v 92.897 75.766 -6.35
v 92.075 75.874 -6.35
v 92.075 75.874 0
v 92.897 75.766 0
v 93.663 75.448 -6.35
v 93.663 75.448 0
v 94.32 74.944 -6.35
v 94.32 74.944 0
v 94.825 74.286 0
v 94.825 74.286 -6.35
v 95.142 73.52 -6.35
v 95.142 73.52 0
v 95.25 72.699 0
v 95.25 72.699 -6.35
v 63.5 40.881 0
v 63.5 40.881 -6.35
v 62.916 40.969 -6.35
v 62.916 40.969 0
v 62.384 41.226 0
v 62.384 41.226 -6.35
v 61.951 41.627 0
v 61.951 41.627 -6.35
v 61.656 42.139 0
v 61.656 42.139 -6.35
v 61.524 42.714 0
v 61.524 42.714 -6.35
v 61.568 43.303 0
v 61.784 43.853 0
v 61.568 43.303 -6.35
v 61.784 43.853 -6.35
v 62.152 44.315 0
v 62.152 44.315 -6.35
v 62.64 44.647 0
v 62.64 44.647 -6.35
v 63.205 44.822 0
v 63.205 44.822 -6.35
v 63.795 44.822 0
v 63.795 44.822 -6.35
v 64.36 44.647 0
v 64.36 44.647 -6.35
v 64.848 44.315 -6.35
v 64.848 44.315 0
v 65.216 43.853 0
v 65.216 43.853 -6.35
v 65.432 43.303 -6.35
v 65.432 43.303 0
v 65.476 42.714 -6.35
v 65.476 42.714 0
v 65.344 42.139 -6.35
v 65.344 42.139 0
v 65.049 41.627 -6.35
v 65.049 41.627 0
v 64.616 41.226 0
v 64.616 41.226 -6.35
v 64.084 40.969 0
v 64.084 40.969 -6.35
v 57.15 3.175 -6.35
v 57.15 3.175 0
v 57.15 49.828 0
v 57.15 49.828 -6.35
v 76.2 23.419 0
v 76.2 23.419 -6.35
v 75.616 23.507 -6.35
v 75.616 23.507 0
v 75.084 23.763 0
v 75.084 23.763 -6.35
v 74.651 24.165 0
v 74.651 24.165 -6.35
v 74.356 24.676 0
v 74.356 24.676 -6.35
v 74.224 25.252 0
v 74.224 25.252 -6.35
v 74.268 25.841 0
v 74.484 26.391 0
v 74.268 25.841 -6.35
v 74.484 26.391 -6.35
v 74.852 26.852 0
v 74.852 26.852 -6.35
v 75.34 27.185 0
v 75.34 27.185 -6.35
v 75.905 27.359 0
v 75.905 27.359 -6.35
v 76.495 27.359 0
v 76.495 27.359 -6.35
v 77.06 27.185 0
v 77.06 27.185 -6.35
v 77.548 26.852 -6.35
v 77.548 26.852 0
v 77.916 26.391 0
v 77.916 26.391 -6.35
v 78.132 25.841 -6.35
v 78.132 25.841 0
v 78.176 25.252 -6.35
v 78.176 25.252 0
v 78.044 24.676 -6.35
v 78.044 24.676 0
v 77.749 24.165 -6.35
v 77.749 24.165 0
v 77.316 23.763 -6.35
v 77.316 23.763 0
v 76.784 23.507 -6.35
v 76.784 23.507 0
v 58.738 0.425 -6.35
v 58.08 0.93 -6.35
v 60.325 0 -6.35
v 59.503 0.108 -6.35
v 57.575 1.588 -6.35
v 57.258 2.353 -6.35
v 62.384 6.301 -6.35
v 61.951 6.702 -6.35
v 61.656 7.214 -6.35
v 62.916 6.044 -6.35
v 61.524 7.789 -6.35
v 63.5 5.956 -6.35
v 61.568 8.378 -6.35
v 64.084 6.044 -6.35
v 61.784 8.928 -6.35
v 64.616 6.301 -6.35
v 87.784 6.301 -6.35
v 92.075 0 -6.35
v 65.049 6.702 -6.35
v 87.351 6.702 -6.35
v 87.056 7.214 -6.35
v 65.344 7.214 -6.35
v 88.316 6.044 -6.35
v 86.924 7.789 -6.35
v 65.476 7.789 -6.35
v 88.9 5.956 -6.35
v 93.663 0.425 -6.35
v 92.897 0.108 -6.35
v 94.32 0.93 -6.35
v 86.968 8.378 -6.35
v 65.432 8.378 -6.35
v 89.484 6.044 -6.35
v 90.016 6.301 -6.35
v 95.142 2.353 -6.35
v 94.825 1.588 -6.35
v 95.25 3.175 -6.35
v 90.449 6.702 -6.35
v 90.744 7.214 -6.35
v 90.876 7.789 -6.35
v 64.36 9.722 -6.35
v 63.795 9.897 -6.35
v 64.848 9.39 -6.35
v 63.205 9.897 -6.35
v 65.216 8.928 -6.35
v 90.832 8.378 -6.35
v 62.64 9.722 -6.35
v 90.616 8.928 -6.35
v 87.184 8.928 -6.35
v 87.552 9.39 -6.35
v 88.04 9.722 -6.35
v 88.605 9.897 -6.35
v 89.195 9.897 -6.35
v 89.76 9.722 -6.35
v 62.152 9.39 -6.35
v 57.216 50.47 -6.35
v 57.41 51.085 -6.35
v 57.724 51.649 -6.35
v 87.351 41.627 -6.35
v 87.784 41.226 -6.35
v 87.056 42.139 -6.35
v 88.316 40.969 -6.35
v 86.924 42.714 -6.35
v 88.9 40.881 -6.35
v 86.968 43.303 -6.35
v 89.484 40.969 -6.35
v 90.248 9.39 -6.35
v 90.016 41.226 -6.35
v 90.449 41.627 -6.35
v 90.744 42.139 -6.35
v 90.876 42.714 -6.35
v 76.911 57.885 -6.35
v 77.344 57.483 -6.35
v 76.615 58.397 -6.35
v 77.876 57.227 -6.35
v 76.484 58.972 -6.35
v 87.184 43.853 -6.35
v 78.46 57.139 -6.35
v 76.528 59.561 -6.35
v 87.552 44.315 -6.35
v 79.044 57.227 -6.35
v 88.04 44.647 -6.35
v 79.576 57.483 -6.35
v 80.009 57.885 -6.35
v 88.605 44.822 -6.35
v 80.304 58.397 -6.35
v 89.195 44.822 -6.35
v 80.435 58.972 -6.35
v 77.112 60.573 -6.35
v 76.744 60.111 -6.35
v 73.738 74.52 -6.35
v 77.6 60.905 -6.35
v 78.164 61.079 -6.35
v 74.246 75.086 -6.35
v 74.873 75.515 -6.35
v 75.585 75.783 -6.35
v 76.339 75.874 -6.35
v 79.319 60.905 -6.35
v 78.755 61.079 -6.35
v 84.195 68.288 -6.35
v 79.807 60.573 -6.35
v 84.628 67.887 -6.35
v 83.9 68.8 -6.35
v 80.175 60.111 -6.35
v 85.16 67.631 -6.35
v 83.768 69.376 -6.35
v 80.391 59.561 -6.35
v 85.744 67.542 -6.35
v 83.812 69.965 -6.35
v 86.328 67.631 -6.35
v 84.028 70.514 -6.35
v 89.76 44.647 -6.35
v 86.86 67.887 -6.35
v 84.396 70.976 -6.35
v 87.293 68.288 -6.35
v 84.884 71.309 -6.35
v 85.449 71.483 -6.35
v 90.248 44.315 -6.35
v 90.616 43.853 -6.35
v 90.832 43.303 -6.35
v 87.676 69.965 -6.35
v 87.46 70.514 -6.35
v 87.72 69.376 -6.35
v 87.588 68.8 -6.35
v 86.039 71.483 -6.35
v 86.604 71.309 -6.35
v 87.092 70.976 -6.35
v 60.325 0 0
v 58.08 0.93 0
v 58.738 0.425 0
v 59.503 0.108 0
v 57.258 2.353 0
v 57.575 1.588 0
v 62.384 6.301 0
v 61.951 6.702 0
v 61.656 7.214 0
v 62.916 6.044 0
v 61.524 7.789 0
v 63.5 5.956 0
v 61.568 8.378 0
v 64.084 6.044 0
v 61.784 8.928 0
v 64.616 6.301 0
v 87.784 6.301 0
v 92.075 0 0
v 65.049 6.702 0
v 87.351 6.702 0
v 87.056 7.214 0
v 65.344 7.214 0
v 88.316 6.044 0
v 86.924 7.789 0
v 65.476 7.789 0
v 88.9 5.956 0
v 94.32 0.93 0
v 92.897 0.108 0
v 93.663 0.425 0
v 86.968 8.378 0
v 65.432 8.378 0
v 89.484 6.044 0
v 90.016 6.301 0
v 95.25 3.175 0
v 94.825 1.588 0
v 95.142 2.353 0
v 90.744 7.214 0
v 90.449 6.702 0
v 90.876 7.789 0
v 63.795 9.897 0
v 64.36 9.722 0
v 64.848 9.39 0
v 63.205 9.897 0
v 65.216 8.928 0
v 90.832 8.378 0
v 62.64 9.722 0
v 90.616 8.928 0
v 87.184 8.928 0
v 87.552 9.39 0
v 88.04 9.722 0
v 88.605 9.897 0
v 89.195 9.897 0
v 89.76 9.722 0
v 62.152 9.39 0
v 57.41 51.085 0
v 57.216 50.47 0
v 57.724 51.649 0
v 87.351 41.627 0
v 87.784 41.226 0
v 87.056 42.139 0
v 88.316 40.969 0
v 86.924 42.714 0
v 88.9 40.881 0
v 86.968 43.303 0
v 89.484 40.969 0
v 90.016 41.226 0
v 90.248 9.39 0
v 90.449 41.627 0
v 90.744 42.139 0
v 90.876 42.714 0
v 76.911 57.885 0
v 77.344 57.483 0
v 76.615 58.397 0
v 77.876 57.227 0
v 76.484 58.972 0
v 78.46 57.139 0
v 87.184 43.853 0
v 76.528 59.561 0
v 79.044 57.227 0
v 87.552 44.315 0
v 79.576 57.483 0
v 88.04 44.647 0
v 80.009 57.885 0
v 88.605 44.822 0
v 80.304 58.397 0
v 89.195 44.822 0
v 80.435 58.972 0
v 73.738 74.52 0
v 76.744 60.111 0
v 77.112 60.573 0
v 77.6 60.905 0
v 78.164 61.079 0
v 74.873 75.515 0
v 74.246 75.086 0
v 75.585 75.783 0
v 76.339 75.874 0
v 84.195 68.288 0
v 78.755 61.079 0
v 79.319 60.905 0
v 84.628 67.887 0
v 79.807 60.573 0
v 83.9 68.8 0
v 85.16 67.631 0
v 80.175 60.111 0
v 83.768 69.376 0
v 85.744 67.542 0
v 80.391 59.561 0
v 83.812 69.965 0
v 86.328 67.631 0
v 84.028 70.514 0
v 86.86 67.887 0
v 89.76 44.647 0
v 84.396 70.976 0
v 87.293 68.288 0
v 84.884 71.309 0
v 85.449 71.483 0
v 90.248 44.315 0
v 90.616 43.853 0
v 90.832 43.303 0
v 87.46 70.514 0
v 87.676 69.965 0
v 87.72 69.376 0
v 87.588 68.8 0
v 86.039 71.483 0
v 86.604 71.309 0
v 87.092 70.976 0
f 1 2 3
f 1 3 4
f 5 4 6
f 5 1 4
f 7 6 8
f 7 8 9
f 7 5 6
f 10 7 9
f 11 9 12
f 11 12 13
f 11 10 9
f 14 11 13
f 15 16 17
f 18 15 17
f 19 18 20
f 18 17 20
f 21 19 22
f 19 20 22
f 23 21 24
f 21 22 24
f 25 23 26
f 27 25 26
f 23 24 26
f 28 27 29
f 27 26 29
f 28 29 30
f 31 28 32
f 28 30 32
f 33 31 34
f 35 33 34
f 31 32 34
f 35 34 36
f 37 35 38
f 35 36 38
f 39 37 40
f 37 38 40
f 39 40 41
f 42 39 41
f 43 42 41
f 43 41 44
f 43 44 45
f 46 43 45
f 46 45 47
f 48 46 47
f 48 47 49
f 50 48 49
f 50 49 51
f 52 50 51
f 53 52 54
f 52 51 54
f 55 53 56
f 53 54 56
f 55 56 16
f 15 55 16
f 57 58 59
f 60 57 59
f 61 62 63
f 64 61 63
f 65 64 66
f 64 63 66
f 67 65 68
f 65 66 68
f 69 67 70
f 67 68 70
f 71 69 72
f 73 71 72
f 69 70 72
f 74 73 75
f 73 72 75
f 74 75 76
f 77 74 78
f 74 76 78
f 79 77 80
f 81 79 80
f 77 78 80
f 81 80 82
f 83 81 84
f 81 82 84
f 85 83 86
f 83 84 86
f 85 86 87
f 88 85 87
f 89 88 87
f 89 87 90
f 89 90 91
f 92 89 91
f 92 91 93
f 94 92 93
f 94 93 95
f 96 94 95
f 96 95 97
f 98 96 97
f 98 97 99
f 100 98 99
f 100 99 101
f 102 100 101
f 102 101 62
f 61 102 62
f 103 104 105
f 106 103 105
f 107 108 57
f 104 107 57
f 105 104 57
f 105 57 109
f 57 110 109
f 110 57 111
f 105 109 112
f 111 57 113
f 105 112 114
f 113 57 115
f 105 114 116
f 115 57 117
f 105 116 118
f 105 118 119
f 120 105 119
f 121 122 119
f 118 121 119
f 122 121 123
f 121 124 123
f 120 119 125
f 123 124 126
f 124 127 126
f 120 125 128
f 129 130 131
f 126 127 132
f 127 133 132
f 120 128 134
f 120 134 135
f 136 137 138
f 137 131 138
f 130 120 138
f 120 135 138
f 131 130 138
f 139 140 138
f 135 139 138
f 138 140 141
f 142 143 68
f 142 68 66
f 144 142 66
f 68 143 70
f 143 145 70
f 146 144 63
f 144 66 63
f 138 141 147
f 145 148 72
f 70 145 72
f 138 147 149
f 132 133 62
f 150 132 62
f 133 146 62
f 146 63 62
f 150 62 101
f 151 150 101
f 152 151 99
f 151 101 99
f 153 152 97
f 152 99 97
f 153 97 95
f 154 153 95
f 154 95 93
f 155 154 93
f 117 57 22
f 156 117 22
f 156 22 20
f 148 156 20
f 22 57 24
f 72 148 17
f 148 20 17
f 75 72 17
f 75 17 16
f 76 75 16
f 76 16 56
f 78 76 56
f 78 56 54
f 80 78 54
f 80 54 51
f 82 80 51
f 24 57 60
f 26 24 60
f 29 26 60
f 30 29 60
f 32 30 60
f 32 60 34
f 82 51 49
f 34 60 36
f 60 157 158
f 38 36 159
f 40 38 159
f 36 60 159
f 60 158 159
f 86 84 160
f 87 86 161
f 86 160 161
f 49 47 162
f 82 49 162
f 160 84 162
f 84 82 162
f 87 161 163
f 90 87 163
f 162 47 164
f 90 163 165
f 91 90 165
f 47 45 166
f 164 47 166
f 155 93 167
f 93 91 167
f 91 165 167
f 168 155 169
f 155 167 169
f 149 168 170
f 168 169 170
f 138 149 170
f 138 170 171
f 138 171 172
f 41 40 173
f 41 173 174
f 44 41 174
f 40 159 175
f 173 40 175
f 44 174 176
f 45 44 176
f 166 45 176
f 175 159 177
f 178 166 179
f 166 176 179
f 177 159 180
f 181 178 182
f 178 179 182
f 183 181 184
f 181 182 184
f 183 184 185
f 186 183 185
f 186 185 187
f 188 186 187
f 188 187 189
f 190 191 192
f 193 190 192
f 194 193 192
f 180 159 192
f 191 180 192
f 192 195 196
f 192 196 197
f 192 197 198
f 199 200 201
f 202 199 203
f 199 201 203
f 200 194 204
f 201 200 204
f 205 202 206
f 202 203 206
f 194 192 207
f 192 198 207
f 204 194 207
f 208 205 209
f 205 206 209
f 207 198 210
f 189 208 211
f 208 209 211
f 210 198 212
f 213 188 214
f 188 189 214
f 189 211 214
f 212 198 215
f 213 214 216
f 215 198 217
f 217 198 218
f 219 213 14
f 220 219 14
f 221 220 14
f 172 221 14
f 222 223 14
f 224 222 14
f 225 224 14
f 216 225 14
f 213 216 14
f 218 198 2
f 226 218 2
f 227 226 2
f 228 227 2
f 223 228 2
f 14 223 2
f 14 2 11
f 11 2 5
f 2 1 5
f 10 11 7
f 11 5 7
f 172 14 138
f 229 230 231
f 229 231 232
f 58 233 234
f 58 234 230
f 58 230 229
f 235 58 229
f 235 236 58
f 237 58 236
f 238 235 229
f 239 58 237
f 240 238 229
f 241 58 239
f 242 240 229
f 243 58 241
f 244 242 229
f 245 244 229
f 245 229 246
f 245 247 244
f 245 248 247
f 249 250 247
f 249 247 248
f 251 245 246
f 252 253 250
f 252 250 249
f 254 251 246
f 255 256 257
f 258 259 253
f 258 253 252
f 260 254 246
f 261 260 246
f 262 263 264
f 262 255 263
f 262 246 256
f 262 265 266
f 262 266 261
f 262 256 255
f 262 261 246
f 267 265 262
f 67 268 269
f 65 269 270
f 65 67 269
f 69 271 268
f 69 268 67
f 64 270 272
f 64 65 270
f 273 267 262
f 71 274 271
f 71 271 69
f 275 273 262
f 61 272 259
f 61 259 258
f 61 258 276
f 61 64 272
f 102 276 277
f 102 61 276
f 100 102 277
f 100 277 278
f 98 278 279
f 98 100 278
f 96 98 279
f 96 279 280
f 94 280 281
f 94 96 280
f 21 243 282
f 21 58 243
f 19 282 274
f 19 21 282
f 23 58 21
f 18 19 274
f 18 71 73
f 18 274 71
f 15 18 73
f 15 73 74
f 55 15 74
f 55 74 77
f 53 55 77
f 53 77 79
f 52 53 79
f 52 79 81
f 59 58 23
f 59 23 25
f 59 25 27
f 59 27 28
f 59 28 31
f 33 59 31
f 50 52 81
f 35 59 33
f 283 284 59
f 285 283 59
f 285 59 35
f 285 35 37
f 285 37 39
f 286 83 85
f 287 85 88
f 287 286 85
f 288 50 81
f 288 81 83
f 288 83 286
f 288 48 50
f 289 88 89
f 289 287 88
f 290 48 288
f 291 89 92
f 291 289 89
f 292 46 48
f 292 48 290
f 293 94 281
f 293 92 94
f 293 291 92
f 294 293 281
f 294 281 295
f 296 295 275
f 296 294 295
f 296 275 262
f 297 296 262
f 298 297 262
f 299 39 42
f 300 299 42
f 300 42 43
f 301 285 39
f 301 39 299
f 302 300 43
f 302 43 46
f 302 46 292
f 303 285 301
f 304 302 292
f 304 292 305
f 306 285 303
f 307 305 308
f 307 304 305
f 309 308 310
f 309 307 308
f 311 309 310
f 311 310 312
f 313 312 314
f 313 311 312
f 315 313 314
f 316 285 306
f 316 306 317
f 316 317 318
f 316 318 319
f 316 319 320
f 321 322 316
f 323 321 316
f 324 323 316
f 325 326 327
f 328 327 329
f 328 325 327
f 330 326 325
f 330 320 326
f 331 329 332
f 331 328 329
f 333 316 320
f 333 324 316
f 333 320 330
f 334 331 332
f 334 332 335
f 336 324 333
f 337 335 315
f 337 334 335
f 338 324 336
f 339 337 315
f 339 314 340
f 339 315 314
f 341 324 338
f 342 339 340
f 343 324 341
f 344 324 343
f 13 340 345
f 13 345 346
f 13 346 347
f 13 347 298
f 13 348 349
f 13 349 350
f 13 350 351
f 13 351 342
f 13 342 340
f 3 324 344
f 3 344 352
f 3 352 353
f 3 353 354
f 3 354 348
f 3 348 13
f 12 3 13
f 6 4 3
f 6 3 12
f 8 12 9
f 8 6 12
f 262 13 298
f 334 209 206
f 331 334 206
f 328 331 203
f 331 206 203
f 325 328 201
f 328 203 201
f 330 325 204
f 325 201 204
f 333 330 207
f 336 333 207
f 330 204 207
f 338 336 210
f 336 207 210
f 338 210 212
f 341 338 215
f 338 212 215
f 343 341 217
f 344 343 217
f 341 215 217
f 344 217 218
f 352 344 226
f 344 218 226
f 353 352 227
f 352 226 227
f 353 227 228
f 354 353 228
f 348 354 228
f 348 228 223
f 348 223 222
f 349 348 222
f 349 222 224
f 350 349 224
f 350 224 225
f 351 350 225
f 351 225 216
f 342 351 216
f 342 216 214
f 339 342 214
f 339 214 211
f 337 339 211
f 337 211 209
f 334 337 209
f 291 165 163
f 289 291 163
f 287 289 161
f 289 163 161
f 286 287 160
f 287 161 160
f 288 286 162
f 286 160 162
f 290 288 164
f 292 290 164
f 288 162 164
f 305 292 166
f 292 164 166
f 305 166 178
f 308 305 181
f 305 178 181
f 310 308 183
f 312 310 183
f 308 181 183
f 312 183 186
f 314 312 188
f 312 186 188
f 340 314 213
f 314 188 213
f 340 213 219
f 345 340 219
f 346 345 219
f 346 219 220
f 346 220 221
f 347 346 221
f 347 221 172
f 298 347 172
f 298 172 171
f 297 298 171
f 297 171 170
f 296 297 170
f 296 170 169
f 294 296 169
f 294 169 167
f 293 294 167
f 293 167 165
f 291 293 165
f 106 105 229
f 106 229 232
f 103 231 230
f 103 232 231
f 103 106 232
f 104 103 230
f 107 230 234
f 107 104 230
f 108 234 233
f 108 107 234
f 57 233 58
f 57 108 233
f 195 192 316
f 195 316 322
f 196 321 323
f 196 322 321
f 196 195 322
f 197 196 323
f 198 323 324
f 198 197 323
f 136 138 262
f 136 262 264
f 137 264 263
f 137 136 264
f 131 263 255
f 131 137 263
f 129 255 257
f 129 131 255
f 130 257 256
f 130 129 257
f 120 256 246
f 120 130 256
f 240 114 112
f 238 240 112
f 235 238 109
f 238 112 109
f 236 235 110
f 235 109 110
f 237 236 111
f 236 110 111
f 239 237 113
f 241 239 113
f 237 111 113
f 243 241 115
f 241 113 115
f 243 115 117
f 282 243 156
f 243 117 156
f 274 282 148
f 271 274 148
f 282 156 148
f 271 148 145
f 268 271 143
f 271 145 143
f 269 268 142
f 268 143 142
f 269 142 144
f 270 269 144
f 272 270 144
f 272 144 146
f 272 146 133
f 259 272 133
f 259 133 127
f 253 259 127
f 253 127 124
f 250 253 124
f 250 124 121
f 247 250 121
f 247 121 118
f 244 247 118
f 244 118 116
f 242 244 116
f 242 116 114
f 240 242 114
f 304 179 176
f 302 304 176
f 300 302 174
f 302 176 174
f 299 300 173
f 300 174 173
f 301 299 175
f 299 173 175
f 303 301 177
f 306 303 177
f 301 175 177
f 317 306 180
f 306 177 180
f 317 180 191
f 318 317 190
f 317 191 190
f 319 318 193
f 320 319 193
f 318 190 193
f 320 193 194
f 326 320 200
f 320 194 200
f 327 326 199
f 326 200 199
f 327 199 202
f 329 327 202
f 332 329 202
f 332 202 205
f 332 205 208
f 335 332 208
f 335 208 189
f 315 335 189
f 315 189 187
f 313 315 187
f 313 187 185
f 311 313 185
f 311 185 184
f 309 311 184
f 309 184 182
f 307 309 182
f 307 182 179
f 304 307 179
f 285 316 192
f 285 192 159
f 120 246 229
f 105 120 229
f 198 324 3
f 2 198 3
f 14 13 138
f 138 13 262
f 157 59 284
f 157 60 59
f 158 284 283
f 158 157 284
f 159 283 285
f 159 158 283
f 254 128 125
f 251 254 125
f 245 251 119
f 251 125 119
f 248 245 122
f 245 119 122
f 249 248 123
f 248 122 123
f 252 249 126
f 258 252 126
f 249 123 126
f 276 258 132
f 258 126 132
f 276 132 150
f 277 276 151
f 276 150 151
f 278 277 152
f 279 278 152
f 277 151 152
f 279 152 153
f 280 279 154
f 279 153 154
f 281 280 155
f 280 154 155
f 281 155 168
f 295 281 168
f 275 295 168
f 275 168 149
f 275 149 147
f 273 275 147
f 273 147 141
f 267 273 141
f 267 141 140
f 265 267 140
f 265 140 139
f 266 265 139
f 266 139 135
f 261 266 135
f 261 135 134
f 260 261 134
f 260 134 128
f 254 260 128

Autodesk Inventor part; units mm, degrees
ref_plane "YZ Plane" through (0, 0, 0) normal (1, 0, 0) x (0, 1, 0)
ref_plane "XZ Plane" through (0, 0, 0) normal (0, 1, 0) x (-1, 0, 0)
ref_plane "XY Plane" through (0, 0, 0) normal (0, 0, 1) x (1, 0, 0)
sketch "Sketch1" plane through (0, 0, 0) normal (0, 0, 1) x (1, 0, 0)
  line L0 (0, 0) -> (355.6, 0) construction
  line L1 (355.6, 0) -> (355.6, 50.8) construction
  line L2 (355.6, 50.8) -> (0, 50.8) construction
  line L3 (0, 50.8) -> (0, 0) construction
  line L4 (57.1297, 50.8) -> (304.8, 404.5099) construction
  line L5 (304.8, 404.5099) -> (325.6065, 389.941) construction
  line L6 (325.6065, 389.941) -> (77.9362, 36.2312) construction
  line L7 (77.9362, 36.2312) -> (57.1297, 50.8) construction
  line L8 (355.6, 50.8) -> (304.8, 50.8) construction
  line L9 (304.8, 50.8) -> (304.8, 438.15) construction
  line L10 (304.8, 438.15) -> (355.6, 438.15) construction
  line L11 (355.6, 438.15) -> (355.6, 50.8) construction
  line L12 (57.15, 75.8737) -> (95.25, 75.8737)
  line L13 (95.25, 75.8737) -> (95.25, 0)
  line L14 (95.25, 0) -> (57.15, 0)
  line L15 (57.15, 0) -> (57.15, 75.8737)
  line L16 (320.675, 41.275) -> (288.925, 41.275) construction
  line L17 (288.925, 41.275) -> (288.925, 9.525) construction
  line L18 (288.925, 9.525) -> (320.675, 9.525) construction
  line L19 (320.675, 9.525) -> (320.675, 41.275) construction
  line L20 (234.95, 41.275) -> (203.2, 41.275) construction
  line L21 (203.2, 41.275) -> (203.2, 9.525) construction
  line L22 (203.2, 9.525) -> (234.95, 9.525) construction
  line L23 (234.95, 9.525) -> (234.95, 41.275) construction
  line L24 (67.5329, 43.5156) -> (111.2395, 105.935) construction
  circle A0 centre (63.5, 42.8625) radius 2.5527 construction
  line L25 (74.6865, 75.8737) -> (57.1297, 50.8)
  point P0 (88.1374, 50.8)
  point P1 (342.9, 42.8625)
  point P2 (330.2, 25.4)
  point P3 (342.9, 7.9375)
  point P4 (355.6, 25.4)
  point P5 (317.5, 42.8625)
  point P6 (304.8, 25.4)
  point P7 (317.5, 7.9375)
  point P8 (292.1, 42.8625)
  point P9 (279.4, 25.4)
  point P10 (292.1, 7.9375)
  point P11 (266.7, 42.8625)
  point P12 (254, 25.4)
  point P13 (266.7, 7.9375)
  point P14 (241.3, 42.8625)
  point P15 (228.6, 25.4)
  point P16 (241.3, 7.9375)
  point P17 (215.9, 42.8625)
  point P18 (203.2, 25.4)
  point P19 (215.9, 7.9375)
  point P20 (190.5, 42.8625)
  point P21 (177.8, 25.4)
  point P22 (190.5, 7.9375)
  point P23 (165.1, 42.8625)
  point P24 (152.4, 25.4)
  point P25 (165.1, 7.9375)
  point P26 (139.7, 42.8625)
  point P27 (127, 25.4)
  point P28 (139.7, 7.9375)
  point P29 (114.3, 42.8625)
  point P30 (101.6, 25.4)
  point P31 (114.3, 7.9375)
  point P32 (88.9, 42.8625)
  point P33 (76.2, 25.4)
  point P34 (88.9, 7.9375)
  point P35 (50.8, 25.4)
  point P36 (63.5, 7.9375)
  point P37 (38.1, 42.8625)
  point P38 (25.4, 25.4)
  point P39 (38.1, 7.9375)
  point P40 (12.7, 42.8625)
  point P41 (0, 25.4)
  point P42 (12.7, 7.9375)
  point P43 (-12.7, 42.8625)
  point P44 (-25.4, 25.4)
  point P45 (-12.7, 7.9375)
  point P46 (320.675, 25.4)
  point P47 (234.95, 25.4)
  point P48 (288.925, 25.4)
  point P49 (78.4596, 59.1204)
  point P50 (85.744, 69.5237)
  point P51 (93.0284, 79.9269)
  point P52 (100.3128, 90.3301)
  point P53 (57.15, 50.829)
  dimension "d0" = 50.8
  dimension "d1" = 355.6
  dimension "d2" = 55
  dimension "d3" = 25.4
  dimension "d4" = 50.8
  dimension "d5" = 387.35
  dimension "d6" = 431.8
  dimension "d10" = 12.7
  dimension "d11" = 7.9375
  dimension "d12" = 25.4
  dimension "d13" = 7.9375
  dimension "d16" = 25.4
  dimension "d21" = 34.925
  dimension "d22" = 31.75
  dimension "d23" = 31.75
  dimension "d24" = 31.75
  dimension "d25" = 120.65
  dimension "d26" = 31.75
  dimension "d27" = 76.2
  dimension "d28" = 19.05
  dimension "d31" = 12.7
  dimension "d37" = 6.35
  dimension "d38" = 6.35
  dimension "d39" = 6.35
  dimension "d40" = 5.1054
extrude "Extrusion1" add sketch "Sketch1" against normal blind 6.35 contours L12 L13 L14 L15 L25
hole "Hole1" at (342.9, 42.8625, 0) at (330.2, 25.4, 0) at (342.9, 7.9375, 0) at (317.5, 42.8625, 0) at (304.8, 25.4, 0) at (317.5, 7.9375, 0) at (292.1, 42.8625, 0) at (279.4, 25.4, 0) at (292.1, 7.9375, 0) at (266.7, 42.8625, 0) at (254, 25.4, 0) at (266.7, 7.9375, 0) at (241.3, 42.8625, 0) at (228.6, 25.4, 0) at (241.3, 7.9375, 0) at (215.9, 42.8625, 0) at (203.2, 25.4, 0) at (215.9, 7.9375, 0) at (190.5, 42.8625, 0) at (177.8, 25.4, 0) at (190.5, 7.9375, 0) at (165.1, 42.8625, 0) at (152.4, 25.4, 0) at (165.1, 7.9375, 0) at (139.7, 42.8625, 0) at (127, 25.4, 0) at (139.7, 7.9375, 0) at (114.3, 42.8625, 0) at (101.6, 25.4, 0) at (114.3, 7.9375, 0) at (88.9, 42.8625, 0) at (76.2, 25.4, 0) at (88.9, 7.9375, 0) at (63.5, 42.8625, 0) at (50.8, 25.4, 0) at (63.5, 7.9375, 0) at (38.1, 42.8625, 0) at (25.4, 25.4, 0) at (38.1, 7.9375, 0) at (12.7, 42.8625, 0) at (0, 25.4, 0) at (12.7, 7.9375, 0) at (-12.7, 42.8625, 0) at (-25.4, 25.4, 0) at (-12.7, 7.9375, 0) at (78.4596, 59.1204, 0) at (85.744, 69.5237, 0) at (93.0284, 79.9269, 0) at (100.3128, 90.3301, 0) direction (0, 0, -1) diameter 3.9624 end through all thread size "10-32 UNF" class "2B" standard "ANSI Unified Screw Threads"
fillet "Fillet1" radius 3.175 5 edges at (57.15, 0, -3.175) (95.25, 0, -3.175) (57.15, 50.829, -3.175) (74.6865, 75.8737, -3.175) (95.25, 75.8737, -3.175)
equation "\"d13\" = d11"
equation "\"d23\" = d22"
equation "\"d24\" = d22"
equation "\"d26\" = d22"
equation "\"d38\" = d37"
equation "\"d39\" = d37"
properties part number "CL7-012" material "Aluminum 6061"
